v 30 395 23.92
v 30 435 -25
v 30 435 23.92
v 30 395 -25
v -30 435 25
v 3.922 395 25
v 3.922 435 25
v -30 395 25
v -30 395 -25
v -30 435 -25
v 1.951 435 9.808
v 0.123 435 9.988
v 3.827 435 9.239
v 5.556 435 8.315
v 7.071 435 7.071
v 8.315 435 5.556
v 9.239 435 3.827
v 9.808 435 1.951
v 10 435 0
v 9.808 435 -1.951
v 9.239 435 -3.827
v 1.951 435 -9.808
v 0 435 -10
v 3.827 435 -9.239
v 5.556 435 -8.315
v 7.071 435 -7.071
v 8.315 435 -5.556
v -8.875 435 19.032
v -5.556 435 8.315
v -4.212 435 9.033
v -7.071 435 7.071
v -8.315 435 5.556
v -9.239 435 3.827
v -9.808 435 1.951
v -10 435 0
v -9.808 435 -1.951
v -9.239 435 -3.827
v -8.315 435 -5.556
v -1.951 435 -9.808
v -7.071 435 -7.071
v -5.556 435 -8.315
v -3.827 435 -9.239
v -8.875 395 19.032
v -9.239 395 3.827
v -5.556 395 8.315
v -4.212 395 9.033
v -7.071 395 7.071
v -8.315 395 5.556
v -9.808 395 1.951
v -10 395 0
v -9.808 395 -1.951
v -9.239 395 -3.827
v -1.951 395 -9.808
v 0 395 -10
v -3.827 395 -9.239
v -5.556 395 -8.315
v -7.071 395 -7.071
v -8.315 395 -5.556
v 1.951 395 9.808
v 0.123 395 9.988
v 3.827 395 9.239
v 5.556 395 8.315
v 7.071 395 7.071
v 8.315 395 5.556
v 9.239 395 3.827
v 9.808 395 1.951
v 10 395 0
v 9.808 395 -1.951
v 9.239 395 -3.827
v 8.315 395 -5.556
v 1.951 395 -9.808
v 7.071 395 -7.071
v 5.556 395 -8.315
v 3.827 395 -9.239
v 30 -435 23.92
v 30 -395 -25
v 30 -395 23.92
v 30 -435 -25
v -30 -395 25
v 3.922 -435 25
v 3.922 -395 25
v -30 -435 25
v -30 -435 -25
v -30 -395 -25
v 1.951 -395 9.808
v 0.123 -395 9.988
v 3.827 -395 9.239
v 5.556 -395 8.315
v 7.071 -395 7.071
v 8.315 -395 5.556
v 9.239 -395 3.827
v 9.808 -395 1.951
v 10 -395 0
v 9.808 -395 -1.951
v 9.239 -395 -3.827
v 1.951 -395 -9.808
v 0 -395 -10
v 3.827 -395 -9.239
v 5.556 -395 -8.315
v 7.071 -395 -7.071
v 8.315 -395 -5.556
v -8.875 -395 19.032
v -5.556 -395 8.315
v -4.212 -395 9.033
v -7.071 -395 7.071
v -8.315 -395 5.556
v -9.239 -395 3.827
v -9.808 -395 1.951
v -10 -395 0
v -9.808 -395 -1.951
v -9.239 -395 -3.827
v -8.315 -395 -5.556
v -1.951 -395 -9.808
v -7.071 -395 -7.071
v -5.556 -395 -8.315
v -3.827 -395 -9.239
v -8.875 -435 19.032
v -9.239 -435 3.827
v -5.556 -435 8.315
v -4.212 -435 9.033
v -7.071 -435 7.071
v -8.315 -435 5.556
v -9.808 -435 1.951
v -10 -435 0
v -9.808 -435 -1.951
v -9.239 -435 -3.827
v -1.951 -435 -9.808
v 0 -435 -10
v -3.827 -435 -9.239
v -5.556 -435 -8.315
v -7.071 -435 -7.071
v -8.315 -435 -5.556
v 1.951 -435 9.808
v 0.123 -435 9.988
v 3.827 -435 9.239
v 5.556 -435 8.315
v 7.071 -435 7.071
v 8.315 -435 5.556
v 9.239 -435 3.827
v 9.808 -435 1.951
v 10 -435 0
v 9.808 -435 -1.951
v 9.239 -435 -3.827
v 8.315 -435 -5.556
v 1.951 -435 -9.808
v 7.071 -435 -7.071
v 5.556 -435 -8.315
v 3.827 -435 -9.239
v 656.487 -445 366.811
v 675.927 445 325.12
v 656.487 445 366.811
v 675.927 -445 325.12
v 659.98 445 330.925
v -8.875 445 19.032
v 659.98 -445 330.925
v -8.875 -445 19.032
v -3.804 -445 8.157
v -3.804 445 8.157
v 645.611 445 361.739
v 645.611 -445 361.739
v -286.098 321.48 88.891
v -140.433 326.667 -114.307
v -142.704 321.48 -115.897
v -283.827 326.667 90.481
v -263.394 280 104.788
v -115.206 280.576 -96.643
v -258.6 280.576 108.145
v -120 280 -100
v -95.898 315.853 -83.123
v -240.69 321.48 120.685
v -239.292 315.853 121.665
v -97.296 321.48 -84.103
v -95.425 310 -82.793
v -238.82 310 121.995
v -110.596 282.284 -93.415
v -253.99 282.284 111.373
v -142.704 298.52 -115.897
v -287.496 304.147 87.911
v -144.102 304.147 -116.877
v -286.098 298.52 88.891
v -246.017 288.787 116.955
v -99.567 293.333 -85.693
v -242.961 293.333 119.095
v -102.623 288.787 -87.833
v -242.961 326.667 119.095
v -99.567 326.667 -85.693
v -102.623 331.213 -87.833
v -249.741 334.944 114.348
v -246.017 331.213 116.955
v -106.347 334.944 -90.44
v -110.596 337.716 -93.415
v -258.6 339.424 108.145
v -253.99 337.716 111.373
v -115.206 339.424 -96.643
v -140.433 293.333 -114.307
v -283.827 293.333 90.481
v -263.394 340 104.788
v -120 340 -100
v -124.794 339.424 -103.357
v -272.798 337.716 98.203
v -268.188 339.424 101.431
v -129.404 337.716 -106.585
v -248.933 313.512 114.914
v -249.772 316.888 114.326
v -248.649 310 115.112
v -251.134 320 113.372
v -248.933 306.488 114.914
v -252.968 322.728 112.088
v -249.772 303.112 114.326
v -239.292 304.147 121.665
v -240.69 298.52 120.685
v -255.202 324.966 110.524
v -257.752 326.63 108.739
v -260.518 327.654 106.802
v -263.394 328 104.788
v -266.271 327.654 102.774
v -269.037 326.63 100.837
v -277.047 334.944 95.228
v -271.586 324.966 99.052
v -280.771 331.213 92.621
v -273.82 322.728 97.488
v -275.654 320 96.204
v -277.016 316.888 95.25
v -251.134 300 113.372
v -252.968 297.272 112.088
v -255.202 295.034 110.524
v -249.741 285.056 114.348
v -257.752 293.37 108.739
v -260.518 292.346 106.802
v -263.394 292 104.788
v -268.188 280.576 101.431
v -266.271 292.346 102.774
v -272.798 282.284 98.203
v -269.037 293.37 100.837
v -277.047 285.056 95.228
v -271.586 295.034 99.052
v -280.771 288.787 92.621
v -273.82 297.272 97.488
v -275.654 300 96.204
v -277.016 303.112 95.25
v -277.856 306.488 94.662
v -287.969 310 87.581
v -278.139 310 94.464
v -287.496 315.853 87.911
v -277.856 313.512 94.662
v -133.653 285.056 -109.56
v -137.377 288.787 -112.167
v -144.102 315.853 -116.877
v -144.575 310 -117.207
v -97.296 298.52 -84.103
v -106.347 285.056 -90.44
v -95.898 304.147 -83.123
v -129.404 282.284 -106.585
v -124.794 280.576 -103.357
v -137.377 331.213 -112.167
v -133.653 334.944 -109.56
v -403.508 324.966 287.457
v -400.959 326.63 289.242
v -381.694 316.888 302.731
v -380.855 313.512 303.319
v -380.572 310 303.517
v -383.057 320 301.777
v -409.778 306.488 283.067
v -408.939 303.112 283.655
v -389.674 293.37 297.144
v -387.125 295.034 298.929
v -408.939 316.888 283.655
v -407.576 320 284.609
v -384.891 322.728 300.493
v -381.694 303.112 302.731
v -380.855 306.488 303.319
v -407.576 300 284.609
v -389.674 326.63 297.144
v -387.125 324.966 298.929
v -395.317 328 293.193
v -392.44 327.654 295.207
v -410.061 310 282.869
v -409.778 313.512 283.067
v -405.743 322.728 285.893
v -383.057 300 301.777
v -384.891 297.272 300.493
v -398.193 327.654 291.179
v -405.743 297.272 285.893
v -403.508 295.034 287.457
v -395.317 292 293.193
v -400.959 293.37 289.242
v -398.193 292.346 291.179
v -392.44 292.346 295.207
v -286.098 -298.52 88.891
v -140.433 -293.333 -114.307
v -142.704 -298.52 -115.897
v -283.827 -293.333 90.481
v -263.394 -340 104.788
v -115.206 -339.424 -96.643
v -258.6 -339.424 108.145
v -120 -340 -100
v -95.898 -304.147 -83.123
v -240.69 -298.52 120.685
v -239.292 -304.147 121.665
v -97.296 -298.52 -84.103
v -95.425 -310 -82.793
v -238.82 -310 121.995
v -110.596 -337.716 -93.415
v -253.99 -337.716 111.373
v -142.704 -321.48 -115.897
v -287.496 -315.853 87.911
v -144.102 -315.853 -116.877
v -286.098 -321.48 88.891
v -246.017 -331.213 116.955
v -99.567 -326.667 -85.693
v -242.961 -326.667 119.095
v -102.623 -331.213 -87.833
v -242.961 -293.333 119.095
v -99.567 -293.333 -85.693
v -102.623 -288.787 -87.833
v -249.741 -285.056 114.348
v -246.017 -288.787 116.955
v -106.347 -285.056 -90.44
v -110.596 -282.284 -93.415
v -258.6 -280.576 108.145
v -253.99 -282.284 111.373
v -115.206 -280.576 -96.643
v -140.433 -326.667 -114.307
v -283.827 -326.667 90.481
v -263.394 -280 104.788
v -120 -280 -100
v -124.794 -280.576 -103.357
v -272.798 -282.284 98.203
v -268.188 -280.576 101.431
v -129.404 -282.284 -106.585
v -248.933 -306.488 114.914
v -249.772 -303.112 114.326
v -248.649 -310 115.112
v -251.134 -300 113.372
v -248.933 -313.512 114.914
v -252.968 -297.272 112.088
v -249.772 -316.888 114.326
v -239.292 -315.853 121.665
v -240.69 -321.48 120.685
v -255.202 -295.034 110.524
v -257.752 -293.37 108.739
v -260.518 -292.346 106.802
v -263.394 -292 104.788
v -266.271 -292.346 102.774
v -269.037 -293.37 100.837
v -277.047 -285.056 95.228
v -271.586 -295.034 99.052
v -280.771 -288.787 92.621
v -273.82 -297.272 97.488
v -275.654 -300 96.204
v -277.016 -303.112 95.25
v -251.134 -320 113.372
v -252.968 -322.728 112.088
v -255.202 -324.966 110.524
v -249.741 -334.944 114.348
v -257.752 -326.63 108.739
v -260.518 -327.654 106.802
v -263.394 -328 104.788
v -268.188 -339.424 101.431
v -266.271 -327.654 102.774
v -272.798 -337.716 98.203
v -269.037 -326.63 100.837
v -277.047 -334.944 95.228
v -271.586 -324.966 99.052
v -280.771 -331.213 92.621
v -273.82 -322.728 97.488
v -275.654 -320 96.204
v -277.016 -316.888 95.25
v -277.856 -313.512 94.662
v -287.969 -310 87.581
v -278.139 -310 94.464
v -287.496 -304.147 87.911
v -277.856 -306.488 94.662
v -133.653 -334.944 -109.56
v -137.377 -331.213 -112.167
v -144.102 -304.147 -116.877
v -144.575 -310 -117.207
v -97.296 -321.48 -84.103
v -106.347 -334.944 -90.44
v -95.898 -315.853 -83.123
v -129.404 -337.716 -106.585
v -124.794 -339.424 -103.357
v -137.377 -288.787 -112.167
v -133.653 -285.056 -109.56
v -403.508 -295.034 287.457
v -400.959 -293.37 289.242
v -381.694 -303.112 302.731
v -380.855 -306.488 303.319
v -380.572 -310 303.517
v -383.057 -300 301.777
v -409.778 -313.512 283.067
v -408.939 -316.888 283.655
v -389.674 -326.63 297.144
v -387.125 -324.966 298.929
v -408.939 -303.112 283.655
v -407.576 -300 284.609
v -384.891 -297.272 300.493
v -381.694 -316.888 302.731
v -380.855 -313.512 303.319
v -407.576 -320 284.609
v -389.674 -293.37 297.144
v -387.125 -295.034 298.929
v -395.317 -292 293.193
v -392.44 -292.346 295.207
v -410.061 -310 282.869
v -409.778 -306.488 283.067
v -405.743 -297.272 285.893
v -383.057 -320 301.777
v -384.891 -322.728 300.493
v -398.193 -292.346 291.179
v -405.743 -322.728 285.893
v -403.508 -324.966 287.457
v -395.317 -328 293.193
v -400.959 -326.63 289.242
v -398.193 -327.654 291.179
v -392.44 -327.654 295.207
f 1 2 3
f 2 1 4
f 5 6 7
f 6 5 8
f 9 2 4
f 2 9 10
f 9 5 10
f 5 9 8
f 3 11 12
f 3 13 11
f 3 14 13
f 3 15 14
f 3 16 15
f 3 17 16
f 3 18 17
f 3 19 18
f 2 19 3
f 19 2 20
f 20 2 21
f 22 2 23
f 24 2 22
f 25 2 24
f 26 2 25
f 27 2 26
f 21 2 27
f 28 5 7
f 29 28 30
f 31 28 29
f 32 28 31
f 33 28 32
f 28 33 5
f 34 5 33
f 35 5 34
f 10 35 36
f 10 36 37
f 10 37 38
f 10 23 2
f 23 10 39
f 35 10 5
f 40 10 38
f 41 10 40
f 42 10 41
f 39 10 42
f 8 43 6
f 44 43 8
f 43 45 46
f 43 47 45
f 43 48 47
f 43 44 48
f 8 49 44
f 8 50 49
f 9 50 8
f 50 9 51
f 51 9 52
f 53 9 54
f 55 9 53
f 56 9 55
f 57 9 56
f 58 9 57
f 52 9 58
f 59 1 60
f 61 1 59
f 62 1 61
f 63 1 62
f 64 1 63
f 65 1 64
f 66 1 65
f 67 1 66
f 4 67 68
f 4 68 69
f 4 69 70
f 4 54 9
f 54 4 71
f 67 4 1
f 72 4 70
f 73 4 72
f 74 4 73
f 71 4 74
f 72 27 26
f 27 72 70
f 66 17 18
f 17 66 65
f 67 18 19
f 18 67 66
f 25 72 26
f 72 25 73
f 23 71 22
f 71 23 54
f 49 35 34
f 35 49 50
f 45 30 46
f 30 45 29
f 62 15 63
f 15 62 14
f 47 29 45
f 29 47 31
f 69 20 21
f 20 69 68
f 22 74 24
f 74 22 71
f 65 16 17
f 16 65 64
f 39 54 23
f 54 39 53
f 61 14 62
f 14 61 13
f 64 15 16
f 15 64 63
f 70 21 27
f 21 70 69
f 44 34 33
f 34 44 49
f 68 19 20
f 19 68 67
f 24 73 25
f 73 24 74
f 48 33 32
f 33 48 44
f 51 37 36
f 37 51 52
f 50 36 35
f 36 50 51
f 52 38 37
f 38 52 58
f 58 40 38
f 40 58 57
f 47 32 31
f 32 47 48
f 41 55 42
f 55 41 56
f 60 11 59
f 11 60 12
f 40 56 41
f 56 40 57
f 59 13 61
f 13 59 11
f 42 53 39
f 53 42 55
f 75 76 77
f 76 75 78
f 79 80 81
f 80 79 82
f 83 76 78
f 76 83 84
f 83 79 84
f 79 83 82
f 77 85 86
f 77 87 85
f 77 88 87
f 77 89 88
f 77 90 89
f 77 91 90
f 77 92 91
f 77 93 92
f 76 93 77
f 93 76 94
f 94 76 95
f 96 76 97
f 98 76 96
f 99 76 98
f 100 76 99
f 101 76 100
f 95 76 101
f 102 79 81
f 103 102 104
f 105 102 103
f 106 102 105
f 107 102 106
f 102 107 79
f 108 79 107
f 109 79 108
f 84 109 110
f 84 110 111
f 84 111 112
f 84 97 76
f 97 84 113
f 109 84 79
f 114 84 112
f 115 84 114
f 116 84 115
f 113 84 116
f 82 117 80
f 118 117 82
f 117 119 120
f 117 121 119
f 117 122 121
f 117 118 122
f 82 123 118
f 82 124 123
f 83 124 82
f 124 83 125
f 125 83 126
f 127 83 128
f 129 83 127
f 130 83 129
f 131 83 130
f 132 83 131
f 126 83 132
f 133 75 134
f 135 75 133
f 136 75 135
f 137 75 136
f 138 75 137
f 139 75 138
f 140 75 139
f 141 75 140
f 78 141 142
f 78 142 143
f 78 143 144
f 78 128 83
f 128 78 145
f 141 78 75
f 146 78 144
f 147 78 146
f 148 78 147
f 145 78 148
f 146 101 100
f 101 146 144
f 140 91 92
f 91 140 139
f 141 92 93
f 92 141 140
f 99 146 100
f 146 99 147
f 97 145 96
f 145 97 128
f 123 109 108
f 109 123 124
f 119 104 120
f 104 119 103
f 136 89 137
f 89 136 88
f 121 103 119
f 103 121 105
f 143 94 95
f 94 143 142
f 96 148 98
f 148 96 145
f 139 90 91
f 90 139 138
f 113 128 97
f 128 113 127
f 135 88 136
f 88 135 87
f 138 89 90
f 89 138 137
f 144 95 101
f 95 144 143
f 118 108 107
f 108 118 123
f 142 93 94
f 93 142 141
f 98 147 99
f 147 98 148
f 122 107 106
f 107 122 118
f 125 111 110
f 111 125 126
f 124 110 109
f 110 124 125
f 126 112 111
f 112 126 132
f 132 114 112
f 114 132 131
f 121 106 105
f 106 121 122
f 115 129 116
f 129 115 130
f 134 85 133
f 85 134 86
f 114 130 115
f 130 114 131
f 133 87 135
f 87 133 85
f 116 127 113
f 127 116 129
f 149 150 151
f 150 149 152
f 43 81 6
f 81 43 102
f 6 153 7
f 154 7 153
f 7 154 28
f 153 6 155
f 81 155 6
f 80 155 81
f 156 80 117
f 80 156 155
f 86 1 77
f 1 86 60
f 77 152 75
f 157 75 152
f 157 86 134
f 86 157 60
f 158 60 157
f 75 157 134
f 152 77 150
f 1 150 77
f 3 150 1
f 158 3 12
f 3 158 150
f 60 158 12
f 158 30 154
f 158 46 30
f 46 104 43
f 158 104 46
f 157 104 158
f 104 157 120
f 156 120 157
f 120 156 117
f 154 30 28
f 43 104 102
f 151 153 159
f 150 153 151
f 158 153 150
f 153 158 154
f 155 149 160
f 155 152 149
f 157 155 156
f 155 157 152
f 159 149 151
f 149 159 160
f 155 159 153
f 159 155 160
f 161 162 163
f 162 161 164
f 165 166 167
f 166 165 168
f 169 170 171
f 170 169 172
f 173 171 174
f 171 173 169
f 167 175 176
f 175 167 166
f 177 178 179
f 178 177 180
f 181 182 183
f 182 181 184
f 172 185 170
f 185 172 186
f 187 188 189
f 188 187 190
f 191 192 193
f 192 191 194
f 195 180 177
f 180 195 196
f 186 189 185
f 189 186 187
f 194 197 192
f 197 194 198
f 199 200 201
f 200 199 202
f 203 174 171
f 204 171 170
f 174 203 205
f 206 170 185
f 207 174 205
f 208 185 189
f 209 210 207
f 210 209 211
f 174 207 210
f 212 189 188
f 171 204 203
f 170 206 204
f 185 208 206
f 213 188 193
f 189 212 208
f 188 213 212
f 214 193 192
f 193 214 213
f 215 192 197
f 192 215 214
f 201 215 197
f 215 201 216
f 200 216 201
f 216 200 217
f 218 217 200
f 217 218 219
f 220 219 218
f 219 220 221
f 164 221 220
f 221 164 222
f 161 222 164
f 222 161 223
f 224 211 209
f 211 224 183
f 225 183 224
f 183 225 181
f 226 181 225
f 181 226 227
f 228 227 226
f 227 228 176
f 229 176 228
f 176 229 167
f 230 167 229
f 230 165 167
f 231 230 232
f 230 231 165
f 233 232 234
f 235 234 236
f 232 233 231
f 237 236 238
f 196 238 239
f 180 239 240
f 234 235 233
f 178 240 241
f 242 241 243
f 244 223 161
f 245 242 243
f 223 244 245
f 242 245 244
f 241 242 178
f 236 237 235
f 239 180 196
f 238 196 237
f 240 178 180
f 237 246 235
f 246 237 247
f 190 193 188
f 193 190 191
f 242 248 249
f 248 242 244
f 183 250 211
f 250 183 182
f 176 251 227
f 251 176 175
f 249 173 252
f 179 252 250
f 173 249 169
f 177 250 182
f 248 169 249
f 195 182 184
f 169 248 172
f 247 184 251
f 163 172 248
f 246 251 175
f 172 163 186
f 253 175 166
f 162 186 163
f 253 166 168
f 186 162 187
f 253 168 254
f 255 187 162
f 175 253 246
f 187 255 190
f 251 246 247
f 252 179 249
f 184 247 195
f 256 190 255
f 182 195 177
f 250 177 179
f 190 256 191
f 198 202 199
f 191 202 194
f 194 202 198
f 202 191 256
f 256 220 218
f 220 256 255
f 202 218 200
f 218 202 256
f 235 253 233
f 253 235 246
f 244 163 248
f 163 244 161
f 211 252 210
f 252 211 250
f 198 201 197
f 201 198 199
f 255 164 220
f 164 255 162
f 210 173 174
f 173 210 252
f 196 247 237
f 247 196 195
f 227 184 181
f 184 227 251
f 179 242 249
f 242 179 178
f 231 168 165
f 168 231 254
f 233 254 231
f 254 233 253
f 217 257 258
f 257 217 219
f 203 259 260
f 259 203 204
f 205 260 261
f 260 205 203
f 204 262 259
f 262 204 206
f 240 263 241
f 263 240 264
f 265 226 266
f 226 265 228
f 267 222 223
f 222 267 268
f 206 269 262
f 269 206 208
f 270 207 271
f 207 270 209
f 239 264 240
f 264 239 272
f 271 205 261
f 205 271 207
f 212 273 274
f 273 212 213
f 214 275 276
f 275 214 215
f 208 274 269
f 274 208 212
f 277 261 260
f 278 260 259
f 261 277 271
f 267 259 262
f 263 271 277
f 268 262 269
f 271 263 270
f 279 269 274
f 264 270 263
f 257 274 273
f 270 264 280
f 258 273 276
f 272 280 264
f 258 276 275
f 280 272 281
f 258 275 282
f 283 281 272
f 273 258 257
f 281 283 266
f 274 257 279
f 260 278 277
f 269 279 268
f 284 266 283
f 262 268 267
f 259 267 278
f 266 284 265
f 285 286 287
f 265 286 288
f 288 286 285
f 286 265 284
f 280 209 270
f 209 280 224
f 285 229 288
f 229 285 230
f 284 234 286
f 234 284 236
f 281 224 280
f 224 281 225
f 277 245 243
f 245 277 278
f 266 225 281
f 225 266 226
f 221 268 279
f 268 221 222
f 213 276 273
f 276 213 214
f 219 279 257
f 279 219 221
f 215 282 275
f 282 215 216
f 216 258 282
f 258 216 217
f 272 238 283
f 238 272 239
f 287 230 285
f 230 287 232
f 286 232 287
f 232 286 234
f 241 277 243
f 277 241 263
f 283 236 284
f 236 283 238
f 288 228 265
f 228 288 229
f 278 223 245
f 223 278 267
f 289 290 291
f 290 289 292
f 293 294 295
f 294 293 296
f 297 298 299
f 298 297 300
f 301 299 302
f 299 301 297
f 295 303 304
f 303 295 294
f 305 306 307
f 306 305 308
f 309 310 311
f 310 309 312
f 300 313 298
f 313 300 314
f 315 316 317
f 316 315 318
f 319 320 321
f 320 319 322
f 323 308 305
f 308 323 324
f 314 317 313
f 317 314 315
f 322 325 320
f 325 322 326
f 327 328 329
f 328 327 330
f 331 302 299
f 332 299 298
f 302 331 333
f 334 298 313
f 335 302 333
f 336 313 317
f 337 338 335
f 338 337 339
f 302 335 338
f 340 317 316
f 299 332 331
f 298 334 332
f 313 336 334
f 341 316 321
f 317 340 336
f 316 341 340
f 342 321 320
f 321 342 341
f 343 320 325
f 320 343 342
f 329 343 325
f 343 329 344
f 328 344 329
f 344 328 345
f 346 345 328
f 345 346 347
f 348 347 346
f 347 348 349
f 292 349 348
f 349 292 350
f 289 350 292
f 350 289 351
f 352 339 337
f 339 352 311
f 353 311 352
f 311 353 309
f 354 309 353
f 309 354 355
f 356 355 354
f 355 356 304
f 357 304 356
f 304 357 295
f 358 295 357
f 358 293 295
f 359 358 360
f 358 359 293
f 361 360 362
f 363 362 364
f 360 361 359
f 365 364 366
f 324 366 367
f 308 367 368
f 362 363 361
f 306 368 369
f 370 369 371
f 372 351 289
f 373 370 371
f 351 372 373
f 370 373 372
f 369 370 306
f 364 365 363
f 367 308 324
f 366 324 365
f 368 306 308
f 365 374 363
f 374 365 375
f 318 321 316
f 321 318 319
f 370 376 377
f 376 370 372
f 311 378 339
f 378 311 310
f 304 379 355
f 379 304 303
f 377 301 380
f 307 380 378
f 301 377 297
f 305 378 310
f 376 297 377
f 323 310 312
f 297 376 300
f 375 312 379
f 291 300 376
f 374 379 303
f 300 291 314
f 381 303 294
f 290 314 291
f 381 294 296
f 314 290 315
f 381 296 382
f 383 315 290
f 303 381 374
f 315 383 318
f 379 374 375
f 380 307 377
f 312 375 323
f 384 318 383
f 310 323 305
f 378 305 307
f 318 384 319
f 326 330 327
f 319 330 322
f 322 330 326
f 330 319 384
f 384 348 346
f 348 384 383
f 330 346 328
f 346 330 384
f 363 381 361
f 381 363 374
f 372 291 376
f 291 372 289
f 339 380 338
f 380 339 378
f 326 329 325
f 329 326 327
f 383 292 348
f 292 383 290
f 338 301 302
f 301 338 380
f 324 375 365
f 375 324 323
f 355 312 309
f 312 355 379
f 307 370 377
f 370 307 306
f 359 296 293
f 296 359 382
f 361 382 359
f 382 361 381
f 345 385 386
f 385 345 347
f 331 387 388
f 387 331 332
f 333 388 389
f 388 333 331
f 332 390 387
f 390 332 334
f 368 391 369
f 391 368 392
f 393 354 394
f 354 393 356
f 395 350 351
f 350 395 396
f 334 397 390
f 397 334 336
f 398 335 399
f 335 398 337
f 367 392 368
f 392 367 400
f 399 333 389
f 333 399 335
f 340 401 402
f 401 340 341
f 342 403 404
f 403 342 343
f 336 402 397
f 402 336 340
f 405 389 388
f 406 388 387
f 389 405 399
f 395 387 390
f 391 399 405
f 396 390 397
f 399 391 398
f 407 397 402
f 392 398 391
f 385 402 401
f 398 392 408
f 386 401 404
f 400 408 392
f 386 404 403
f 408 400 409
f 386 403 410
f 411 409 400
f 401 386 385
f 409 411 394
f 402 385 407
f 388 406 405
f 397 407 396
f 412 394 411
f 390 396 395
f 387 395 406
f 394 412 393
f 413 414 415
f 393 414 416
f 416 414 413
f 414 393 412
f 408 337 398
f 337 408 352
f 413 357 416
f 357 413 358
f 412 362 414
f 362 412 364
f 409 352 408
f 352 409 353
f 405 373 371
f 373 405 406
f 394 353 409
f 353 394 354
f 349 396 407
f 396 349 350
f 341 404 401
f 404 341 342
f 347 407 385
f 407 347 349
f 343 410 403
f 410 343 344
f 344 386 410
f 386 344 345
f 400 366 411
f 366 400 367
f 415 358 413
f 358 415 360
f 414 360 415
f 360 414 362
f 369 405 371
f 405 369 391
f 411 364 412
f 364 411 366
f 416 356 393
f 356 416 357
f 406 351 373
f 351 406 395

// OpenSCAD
// USS Iowa Orthopedic Bed: Articulating Sub-Assembly
// Parametric Hydraulic Actuator and Pivot Hinge Matrix

$fn = 32;

base_plate_w = 930.0;
backrest_l   = 750.0;
cylinder_r   = 30.0;
stroke_ext   = 180.0; // Current extension parameter of the hydraulic ram

module mounting_pivot_brackets() {
    // Heavy dual-shear hinge brackets anchored to main bed rails
    color("dimgray") {
        translate([0,  base_plate_w/2 - 50, 0])
            difference() {
                cube([60, 40, 50], center=true);
                rotate([90, 0, 0]) cylinder(r=10, h=50, center=true);
            }
        translate([0, -base_plate_w/2 + 50, 0])
            difference() {
                cube([60, 40, 50], center=true);
                rotate([90, 0, 0]) cylinder(r=10, h=50, center=true);
            }
    }
}

module hydraulic_cylinder(extension) {
    // Dual-stage pneumatic/hydraulic cylinder for heavy patient manipulation
    rotate([0, -35, 0]) { // 35-degree entry inclination angle
        // Outer Pressure Sleeve
        color("darkblue") 
            cylinder(r=cylinder_r, h=250, center=false);
        // Internal Piston Rod 
        color("silver") 
            translate([0, 0, 200]) 
                cylinder(r=cylinder_r - 12, h=100 + extension, center=false);
    }
}

module articulating_frame_plate() {
    // Canvas/board support plane that forms the upper mattress support section
    rotate([0, -25, 0]) // Controlled tilt angle
    translate([backrest_l/2, 0, 15]) {
        color("charcoal", 0.9) 
            cube([backrest_l, base_plate_w - 40, 12], center=true);
        // Retaining edge lip to prevent mattress migration under roll conditions
        translate([backrest_l/2 - 6, 0, 20])
            color("black") cube([12, base_plate_w - 40, 40], center=true);
    }
}

// Render Composition Array
union() {
    mounting_pivot_brackets();
    articulating_frame_plate();
    
    // Left and Right High-Capacity Actuators
    translate([-120,  base_plate_w/3, -100]) hydraulic_cylinder(stroke_ext);
    translate([-120, -base_plate_w/3, -100]) hydraulic_cylinder(stroke_ext);
}
